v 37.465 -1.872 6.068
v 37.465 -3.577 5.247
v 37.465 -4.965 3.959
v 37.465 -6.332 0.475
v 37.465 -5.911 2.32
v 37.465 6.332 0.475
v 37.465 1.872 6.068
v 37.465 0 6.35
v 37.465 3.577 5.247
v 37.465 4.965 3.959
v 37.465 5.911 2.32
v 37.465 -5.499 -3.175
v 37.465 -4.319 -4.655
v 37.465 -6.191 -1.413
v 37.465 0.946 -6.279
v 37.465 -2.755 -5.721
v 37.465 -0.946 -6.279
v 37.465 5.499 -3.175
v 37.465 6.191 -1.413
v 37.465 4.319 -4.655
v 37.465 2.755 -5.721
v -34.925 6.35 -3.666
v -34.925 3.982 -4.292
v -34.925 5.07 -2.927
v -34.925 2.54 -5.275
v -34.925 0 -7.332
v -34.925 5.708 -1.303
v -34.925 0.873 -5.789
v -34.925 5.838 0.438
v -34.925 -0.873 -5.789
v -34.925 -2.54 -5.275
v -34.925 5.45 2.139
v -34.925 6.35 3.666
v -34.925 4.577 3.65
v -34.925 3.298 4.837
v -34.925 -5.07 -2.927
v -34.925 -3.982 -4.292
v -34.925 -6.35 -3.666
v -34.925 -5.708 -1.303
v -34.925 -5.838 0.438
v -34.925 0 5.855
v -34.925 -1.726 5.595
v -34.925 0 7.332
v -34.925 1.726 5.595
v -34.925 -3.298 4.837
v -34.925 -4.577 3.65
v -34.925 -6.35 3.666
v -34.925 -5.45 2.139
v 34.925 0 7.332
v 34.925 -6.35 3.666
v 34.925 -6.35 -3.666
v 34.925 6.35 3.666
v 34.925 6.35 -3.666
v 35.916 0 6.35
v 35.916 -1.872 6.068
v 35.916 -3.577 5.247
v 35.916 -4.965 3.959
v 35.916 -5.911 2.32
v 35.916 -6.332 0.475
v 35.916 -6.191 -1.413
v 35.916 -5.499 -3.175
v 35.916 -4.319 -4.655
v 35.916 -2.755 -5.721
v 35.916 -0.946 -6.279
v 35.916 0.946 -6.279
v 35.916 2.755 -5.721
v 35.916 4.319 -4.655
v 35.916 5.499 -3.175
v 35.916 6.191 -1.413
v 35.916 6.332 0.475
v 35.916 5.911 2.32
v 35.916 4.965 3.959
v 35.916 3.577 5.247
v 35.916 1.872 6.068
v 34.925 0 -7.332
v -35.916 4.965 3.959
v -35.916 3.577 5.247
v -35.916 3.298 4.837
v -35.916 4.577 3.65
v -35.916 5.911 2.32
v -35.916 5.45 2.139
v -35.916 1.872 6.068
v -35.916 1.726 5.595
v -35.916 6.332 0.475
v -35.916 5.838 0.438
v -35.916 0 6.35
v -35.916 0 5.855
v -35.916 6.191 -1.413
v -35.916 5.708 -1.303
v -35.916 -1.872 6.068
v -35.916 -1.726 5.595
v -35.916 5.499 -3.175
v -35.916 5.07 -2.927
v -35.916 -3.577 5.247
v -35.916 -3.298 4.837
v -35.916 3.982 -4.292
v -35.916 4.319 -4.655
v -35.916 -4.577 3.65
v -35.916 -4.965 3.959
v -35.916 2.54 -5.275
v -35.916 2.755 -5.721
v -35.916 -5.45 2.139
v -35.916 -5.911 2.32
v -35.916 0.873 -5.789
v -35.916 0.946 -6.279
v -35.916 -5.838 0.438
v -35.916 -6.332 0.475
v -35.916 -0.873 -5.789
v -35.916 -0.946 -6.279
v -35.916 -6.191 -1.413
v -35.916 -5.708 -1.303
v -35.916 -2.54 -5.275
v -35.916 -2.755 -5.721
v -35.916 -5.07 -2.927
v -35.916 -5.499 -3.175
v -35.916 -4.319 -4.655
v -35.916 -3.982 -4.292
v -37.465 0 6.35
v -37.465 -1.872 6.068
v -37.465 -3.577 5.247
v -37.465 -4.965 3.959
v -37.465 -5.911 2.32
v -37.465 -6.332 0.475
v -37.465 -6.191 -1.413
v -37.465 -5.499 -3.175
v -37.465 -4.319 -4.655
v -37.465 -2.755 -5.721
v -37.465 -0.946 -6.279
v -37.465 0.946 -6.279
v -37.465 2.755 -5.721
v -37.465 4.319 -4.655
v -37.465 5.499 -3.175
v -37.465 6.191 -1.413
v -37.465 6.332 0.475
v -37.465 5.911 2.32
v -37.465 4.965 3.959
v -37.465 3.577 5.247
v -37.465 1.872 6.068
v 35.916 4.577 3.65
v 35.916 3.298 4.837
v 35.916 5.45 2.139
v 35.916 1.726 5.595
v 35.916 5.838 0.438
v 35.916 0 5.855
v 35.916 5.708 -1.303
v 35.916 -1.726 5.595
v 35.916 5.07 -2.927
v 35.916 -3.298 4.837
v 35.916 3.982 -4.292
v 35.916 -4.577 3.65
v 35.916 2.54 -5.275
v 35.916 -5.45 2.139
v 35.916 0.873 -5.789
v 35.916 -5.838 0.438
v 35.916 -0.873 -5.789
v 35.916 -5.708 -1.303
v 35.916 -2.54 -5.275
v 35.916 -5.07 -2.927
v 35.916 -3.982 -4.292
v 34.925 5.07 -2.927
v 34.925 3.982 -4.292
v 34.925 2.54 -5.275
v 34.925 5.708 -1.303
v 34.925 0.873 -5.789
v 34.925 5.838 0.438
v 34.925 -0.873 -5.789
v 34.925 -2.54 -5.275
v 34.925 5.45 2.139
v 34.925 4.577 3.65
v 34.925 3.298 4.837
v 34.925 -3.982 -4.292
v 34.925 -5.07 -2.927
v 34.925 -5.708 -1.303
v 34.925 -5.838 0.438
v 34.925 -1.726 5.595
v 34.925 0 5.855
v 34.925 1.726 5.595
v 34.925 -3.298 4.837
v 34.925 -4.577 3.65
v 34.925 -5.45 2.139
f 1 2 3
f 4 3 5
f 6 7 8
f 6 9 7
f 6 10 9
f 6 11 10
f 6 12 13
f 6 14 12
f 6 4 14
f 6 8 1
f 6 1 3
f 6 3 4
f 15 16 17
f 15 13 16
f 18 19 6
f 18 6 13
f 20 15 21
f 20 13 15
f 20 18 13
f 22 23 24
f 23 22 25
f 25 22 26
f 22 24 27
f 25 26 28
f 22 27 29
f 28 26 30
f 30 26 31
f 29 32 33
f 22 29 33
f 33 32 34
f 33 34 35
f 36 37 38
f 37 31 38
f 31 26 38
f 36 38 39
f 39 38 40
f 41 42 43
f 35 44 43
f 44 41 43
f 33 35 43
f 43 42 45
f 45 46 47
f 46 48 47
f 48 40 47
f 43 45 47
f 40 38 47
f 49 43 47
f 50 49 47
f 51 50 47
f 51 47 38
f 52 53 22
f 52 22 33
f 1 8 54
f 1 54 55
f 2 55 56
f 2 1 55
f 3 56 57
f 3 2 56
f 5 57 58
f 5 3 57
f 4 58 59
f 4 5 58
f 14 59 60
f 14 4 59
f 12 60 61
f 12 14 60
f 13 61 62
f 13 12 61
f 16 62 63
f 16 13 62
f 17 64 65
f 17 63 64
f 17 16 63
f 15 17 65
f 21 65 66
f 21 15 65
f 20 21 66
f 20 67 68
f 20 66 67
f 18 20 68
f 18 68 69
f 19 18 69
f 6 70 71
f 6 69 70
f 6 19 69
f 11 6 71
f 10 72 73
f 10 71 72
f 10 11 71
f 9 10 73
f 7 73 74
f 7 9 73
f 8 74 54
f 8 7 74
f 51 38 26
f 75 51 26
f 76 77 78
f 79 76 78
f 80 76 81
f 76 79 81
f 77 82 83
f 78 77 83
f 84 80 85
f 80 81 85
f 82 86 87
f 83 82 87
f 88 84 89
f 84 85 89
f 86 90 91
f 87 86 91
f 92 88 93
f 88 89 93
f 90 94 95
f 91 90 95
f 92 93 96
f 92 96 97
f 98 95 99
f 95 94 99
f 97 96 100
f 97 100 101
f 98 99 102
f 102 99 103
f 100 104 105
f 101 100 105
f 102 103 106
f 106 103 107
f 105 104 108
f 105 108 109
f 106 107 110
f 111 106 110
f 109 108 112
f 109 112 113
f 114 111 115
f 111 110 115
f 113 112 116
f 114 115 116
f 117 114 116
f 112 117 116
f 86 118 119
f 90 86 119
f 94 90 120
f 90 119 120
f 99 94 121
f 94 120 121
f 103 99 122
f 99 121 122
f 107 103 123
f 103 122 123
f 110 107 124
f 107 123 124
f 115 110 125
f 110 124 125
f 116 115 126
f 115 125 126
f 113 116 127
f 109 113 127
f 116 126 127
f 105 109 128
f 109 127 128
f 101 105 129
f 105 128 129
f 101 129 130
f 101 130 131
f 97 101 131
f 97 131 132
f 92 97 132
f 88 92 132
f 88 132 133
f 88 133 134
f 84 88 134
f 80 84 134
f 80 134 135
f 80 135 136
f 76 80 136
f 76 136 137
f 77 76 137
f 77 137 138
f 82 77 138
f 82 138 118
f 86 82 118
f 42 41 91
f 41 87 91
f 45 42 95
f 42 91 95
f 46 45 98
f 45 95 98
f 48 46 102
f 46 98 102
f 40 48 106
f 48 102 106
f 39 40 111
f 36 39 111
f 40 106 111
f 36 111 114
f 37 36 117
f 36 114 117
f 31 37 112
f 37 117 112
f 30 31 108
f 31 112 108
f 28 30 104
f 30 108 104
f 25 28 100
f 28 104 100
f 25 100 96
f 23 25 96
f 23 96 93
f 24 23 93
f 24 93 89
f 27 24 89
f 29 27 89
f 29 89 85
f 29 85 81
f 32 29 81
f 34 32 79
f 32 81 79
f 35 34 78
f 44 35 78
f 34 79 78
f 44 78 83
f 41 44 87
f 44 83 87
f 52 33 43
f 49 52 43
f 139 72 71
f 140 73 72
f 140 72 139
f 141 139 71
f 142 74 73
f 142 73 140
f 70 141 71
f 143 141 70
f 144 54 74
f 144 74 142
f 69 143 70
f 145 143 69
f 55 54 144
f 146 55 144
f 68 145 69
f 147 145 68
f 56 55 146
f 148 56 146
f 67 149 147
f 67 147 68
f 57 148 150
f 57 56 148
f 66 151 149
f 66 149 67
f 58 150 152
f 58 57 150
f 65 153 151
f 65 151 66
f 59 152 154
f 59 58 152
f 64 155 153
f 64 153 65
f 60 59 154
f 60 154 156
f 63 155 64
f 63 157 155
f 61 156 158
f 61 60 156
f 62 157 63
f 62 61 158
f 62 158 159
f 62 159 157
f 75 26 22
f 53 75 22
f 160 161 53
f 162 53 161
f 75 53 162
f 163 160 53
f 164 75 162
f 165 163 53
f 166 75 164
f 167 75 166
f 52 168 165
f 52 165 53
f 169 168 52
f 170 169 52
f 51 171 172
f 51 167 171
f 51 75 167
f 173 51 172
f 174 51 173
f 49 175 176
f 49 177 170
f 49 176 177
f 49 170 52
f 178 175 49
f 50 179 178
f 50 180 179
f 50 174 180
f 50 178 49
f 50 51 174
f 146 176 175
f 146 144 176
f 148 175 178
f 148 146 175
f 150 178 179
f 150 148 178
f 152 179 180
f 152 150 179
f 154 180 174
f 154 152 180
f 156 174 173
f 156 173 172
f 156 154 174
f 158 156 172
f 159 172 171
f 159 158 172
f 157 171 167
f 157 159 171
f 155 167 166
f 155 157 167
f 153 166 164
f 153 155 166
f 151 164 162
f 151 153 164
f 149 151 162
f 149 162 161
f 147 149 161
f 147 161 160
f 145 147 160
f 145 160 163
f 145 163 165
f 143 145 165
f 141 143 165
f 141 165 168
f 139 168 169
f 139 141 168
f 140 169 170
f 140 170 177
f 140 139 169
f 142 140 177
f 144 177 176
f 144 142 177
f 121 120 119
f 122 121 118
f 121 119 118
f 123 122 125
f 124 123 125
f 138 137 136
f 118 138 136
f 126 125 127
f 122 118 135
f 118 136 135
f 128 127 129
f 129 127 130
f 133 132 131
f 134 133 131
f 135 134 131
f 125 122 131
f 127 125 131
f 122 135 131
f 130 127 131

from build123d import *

# Parameters (mm, degrees)
BOSS_EXTRUDE1_DEPTH = 37.465


with BuildPart() as part:
    # Sketch1 → Boss-Extrude1 (new, symmetric)
    with BuildSketch(Plane(origin=(0, 0, 0), x_dir=(0, 0, -1), z_dir=(1, 0, 0))):
        Polygon((7.332348419, 0), (3.666174209, 6.35), (-3.666174209, 6.35), (-7.332348419, 0), (-3.666174209, -6.35), (3.666174209, -6.35), align=None)
    extrude(amount=BOSS_EXTRUDE1_DEPTH, both=True)

    # Sketch2 → Cut-Revolve1 (revolve, cut)
    with BuildSketch(Plane(origin=(0, 0, 0), x_dir=(1, 0, 0), z_dir=(0, 1, 0))):
        Polygon((34.925, -5.8547), (35.9156, -5.8547), (35.9156, -6.35), (37.465, -6.35), (37.465, -8.89), (34.925, -8.89), align=None)
    cut_revolve1 = revolve(axis=Axis((0, 0, 0), (1, 0, 0)), mode=Mode.SUBTRACT)

    # Mirror1: Cut-Revolve1 across plane
    add(cut_revolve1.mirror(Plane(origin=(0, 0, 0), x_dir=(0, 0, 1), z_dir=(1, 0, 0))), mode=Mode.SUBTRACT)


solid = part.part
